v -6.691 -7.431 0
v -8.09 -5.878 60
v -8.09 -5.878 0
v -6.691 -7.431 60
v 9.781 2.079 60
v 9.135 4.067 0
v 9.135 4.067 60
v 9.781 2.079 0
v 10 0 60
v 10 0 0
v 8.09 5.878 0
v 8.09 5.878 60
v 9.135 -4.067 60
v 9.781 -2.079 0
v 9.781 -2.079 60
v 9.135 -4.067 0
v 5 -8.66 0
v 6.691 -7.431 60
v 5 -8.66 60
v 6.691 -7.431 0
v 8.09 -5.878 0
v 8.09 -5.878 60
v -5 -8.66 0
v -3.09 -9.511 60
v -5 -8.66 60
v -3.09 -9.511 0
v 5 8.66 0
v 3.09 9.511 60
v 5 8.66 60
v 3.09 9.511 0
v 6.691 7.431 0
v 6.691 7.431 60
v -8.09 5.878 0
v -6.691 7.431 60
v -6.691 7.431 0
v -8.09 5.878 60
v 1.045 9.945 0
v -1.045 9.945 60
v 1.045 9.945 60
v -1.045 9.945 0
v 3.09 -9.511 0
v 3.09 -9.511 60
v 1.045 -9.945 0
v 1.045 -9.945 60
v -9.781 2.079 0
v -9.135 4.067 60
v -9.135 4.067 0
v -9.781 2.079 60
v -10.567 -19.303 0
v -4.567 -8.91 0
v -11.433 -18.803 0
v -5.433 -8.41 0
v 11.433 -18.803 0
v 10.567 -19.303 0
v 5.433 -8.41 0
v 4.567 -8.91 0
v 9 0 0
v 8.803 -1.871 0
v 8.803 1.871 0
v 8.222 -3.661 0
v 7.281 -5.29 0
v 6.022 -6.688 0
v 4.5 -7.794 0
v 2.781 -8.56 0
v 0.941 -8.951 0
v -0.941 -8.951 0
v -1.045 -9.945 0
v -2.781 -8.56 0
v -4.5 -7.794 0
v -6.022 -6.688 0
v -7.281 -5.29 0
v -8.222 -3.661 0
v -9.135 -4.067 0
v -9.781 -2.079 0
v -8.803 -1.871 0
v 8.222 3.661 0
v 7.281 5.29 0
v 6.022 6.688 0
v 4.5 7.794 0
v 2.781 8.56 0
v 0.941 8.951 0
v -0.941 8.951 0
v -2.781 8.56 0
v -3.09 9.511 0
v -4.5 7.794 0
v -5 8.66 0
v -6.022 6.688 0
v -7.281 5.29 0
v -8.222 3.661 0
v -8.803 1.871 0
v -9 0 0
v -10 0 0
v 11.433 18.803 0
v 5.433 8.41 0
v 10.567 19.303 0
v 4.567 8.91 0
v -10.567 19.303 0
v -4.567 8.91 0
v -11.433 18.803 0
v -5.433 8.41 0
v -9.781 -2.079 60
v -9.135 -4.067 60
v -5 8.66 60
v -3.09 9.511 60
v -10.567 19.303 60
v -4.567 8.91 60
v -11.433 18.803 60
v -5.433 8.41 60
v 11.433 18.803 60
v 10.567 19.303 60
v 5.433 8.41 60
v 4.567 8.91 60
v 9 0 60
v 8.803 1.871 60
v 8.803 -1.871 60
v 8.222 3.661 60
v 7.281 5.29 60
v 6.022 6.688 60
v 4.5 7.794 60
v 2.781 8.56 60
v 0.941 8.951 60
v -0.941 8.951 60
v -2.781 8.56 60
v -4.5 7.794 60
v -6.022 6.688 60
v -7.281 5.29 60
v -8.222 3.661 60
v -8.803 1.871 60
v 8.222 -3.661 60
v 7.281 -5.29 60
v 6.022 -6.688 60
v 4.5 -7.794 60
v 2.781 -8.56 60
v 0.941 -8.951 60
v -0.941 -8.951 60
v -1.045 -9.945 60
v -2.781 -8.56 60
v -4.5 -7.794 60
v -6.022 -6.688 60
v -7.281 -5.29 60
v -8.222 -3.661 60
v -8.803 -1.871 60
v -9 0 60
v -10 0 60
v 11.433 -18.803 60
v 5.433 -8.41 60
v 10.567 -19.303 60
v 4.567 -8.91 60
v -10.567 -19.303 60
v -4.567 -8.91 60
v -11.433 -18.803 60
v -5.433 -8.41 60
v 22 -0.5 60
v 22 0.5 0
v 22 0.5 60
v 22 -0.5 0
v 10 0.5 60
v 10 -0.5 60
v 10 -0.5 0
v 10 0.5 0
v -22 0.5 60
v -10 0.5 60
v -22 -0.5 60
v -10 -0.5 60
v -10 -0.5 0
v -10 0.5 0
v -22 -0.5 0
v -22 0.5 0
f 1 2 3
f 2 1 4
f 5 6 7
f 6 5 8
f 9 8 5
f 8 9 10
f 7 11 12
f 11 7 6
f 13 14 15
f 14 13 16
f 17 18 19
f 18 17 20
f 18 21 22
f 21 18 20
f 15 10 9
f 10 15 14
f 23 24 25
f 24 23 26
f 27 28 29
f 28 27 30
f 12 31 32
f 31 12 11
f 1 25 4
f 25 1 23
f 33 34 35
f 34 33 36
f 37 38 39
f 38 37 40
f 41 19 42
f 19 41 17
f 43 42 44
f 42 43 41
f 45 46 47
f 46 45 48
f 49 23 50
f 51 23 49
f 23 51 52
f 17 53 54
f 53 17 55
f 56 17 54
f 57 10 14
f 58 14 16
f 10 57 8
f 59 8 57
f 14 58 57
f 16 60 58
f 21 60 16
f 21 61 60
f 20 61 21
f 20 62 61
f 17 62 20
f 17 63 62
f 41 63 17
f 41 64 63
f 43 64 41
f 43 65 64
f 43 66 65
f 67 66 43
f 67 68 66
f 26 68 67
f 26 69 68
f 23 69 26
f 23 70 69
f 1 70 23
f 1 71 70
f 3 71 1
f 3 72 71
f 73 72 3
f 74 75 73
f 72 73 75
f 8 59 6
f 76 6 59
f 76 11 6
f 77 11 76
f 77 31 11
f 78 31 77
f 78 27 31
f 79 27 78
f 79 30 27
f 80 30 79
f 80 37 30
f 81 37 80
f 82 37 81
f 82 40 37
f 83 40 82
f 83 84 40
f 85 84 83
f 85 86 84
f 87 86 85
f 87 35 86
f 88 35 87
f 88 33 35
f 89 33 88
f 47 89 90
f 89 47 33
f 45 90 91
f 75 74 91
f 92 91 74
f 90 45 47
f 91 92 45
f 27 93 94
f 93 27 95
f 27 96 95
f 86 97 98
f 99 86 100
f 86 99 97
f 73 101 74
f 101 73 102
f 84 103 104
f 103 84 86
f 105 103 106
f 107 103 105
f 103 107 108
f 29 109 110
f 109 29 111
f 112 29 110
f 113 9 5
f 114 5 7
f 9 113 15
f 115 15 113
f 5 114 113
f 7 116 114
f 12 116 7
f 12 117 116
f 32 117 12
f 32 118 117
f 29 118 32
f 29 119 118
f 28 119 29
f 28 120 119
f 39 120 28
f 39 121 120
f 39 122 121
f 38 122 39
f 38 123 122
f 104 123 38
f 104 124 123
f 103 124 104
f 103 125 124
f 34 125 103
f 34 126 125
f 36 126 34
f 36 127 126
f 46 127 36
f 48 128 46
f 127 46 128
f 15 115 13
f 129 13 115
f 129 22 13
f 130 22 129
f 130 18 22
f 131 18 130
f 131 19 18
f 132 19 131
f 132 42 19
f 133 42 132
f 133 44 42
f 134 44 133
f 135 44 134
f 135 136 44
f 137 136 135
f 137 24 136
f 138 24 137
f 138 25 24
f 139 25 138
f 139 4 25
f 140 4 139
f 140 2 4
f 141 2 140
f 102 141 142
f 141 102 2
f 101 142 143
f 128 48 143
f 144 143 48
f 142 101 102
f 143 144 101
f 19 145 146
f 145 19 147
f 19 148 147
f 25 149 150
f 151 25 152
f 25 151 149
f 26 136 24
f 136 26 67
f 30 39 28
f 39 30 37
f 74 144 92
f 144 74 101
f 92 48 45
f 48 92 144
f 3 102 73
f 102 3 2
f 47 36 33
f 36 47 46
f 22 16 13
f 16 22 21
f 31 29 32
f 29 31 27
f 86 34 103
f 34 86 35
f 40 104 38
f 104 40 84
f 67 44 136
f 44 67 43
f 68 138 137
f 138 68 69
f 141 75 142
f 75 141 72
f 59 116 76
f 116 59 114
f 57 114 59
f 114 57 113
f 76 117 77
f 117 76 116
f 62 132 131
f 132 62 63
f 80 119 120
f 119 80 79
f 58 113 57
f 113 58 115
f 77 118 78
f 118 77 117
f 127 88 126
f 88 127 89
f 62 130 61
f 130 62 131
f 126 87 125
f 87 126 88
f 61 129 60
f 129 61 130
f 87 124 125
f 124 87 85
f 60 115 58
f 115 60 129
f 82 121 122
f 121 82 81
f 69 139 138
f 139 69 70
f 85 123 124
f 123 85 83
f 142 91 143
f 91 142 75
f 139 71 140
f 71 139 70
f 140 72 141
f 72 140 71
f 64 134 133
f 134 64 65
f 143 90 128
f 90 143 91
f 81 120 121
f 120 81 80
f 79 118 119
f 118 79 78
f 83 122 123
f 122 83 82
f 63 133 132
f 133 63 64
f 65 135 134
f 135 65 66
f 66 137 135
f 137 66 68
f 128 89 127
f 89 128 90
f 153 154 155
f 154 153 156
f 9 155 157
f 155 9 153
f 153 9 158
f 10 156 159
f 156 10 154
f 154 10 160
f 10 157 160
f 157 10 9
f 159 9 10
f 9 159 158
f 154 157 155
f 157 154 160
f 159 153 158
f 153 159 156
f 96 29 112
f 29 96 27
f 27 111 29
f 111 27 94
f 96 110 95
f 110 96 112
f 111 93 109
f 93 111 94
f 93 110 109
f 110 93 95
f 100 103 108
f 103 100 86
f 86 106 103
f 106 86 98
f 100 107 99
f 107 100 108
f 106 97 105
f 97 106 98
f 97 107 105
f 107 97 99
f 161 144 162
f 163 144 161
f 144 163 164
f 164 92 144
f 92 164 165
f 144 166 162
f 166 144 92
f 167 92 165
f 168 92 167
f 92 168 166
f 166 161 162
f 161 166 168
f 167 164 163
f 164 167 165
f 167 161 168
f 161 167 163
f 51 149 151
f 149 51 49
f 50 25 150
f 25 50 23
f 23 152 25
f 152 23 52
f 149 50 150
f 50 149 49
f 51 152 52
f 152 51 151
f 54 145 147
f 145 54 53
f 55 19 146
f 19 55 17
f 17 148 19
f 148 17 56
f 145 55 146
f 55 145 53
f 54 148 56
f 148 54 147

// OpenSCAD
$fn=30;

difference(){
    cylinder(d=20,h=60);
    translate([0,0,-1])cylinder(d=18,h=62);
}

for (j=[0:60:300]){
    rotate([0,0,j])
    translate([10,-.5,0])
    cube([12,1,60]);
}
